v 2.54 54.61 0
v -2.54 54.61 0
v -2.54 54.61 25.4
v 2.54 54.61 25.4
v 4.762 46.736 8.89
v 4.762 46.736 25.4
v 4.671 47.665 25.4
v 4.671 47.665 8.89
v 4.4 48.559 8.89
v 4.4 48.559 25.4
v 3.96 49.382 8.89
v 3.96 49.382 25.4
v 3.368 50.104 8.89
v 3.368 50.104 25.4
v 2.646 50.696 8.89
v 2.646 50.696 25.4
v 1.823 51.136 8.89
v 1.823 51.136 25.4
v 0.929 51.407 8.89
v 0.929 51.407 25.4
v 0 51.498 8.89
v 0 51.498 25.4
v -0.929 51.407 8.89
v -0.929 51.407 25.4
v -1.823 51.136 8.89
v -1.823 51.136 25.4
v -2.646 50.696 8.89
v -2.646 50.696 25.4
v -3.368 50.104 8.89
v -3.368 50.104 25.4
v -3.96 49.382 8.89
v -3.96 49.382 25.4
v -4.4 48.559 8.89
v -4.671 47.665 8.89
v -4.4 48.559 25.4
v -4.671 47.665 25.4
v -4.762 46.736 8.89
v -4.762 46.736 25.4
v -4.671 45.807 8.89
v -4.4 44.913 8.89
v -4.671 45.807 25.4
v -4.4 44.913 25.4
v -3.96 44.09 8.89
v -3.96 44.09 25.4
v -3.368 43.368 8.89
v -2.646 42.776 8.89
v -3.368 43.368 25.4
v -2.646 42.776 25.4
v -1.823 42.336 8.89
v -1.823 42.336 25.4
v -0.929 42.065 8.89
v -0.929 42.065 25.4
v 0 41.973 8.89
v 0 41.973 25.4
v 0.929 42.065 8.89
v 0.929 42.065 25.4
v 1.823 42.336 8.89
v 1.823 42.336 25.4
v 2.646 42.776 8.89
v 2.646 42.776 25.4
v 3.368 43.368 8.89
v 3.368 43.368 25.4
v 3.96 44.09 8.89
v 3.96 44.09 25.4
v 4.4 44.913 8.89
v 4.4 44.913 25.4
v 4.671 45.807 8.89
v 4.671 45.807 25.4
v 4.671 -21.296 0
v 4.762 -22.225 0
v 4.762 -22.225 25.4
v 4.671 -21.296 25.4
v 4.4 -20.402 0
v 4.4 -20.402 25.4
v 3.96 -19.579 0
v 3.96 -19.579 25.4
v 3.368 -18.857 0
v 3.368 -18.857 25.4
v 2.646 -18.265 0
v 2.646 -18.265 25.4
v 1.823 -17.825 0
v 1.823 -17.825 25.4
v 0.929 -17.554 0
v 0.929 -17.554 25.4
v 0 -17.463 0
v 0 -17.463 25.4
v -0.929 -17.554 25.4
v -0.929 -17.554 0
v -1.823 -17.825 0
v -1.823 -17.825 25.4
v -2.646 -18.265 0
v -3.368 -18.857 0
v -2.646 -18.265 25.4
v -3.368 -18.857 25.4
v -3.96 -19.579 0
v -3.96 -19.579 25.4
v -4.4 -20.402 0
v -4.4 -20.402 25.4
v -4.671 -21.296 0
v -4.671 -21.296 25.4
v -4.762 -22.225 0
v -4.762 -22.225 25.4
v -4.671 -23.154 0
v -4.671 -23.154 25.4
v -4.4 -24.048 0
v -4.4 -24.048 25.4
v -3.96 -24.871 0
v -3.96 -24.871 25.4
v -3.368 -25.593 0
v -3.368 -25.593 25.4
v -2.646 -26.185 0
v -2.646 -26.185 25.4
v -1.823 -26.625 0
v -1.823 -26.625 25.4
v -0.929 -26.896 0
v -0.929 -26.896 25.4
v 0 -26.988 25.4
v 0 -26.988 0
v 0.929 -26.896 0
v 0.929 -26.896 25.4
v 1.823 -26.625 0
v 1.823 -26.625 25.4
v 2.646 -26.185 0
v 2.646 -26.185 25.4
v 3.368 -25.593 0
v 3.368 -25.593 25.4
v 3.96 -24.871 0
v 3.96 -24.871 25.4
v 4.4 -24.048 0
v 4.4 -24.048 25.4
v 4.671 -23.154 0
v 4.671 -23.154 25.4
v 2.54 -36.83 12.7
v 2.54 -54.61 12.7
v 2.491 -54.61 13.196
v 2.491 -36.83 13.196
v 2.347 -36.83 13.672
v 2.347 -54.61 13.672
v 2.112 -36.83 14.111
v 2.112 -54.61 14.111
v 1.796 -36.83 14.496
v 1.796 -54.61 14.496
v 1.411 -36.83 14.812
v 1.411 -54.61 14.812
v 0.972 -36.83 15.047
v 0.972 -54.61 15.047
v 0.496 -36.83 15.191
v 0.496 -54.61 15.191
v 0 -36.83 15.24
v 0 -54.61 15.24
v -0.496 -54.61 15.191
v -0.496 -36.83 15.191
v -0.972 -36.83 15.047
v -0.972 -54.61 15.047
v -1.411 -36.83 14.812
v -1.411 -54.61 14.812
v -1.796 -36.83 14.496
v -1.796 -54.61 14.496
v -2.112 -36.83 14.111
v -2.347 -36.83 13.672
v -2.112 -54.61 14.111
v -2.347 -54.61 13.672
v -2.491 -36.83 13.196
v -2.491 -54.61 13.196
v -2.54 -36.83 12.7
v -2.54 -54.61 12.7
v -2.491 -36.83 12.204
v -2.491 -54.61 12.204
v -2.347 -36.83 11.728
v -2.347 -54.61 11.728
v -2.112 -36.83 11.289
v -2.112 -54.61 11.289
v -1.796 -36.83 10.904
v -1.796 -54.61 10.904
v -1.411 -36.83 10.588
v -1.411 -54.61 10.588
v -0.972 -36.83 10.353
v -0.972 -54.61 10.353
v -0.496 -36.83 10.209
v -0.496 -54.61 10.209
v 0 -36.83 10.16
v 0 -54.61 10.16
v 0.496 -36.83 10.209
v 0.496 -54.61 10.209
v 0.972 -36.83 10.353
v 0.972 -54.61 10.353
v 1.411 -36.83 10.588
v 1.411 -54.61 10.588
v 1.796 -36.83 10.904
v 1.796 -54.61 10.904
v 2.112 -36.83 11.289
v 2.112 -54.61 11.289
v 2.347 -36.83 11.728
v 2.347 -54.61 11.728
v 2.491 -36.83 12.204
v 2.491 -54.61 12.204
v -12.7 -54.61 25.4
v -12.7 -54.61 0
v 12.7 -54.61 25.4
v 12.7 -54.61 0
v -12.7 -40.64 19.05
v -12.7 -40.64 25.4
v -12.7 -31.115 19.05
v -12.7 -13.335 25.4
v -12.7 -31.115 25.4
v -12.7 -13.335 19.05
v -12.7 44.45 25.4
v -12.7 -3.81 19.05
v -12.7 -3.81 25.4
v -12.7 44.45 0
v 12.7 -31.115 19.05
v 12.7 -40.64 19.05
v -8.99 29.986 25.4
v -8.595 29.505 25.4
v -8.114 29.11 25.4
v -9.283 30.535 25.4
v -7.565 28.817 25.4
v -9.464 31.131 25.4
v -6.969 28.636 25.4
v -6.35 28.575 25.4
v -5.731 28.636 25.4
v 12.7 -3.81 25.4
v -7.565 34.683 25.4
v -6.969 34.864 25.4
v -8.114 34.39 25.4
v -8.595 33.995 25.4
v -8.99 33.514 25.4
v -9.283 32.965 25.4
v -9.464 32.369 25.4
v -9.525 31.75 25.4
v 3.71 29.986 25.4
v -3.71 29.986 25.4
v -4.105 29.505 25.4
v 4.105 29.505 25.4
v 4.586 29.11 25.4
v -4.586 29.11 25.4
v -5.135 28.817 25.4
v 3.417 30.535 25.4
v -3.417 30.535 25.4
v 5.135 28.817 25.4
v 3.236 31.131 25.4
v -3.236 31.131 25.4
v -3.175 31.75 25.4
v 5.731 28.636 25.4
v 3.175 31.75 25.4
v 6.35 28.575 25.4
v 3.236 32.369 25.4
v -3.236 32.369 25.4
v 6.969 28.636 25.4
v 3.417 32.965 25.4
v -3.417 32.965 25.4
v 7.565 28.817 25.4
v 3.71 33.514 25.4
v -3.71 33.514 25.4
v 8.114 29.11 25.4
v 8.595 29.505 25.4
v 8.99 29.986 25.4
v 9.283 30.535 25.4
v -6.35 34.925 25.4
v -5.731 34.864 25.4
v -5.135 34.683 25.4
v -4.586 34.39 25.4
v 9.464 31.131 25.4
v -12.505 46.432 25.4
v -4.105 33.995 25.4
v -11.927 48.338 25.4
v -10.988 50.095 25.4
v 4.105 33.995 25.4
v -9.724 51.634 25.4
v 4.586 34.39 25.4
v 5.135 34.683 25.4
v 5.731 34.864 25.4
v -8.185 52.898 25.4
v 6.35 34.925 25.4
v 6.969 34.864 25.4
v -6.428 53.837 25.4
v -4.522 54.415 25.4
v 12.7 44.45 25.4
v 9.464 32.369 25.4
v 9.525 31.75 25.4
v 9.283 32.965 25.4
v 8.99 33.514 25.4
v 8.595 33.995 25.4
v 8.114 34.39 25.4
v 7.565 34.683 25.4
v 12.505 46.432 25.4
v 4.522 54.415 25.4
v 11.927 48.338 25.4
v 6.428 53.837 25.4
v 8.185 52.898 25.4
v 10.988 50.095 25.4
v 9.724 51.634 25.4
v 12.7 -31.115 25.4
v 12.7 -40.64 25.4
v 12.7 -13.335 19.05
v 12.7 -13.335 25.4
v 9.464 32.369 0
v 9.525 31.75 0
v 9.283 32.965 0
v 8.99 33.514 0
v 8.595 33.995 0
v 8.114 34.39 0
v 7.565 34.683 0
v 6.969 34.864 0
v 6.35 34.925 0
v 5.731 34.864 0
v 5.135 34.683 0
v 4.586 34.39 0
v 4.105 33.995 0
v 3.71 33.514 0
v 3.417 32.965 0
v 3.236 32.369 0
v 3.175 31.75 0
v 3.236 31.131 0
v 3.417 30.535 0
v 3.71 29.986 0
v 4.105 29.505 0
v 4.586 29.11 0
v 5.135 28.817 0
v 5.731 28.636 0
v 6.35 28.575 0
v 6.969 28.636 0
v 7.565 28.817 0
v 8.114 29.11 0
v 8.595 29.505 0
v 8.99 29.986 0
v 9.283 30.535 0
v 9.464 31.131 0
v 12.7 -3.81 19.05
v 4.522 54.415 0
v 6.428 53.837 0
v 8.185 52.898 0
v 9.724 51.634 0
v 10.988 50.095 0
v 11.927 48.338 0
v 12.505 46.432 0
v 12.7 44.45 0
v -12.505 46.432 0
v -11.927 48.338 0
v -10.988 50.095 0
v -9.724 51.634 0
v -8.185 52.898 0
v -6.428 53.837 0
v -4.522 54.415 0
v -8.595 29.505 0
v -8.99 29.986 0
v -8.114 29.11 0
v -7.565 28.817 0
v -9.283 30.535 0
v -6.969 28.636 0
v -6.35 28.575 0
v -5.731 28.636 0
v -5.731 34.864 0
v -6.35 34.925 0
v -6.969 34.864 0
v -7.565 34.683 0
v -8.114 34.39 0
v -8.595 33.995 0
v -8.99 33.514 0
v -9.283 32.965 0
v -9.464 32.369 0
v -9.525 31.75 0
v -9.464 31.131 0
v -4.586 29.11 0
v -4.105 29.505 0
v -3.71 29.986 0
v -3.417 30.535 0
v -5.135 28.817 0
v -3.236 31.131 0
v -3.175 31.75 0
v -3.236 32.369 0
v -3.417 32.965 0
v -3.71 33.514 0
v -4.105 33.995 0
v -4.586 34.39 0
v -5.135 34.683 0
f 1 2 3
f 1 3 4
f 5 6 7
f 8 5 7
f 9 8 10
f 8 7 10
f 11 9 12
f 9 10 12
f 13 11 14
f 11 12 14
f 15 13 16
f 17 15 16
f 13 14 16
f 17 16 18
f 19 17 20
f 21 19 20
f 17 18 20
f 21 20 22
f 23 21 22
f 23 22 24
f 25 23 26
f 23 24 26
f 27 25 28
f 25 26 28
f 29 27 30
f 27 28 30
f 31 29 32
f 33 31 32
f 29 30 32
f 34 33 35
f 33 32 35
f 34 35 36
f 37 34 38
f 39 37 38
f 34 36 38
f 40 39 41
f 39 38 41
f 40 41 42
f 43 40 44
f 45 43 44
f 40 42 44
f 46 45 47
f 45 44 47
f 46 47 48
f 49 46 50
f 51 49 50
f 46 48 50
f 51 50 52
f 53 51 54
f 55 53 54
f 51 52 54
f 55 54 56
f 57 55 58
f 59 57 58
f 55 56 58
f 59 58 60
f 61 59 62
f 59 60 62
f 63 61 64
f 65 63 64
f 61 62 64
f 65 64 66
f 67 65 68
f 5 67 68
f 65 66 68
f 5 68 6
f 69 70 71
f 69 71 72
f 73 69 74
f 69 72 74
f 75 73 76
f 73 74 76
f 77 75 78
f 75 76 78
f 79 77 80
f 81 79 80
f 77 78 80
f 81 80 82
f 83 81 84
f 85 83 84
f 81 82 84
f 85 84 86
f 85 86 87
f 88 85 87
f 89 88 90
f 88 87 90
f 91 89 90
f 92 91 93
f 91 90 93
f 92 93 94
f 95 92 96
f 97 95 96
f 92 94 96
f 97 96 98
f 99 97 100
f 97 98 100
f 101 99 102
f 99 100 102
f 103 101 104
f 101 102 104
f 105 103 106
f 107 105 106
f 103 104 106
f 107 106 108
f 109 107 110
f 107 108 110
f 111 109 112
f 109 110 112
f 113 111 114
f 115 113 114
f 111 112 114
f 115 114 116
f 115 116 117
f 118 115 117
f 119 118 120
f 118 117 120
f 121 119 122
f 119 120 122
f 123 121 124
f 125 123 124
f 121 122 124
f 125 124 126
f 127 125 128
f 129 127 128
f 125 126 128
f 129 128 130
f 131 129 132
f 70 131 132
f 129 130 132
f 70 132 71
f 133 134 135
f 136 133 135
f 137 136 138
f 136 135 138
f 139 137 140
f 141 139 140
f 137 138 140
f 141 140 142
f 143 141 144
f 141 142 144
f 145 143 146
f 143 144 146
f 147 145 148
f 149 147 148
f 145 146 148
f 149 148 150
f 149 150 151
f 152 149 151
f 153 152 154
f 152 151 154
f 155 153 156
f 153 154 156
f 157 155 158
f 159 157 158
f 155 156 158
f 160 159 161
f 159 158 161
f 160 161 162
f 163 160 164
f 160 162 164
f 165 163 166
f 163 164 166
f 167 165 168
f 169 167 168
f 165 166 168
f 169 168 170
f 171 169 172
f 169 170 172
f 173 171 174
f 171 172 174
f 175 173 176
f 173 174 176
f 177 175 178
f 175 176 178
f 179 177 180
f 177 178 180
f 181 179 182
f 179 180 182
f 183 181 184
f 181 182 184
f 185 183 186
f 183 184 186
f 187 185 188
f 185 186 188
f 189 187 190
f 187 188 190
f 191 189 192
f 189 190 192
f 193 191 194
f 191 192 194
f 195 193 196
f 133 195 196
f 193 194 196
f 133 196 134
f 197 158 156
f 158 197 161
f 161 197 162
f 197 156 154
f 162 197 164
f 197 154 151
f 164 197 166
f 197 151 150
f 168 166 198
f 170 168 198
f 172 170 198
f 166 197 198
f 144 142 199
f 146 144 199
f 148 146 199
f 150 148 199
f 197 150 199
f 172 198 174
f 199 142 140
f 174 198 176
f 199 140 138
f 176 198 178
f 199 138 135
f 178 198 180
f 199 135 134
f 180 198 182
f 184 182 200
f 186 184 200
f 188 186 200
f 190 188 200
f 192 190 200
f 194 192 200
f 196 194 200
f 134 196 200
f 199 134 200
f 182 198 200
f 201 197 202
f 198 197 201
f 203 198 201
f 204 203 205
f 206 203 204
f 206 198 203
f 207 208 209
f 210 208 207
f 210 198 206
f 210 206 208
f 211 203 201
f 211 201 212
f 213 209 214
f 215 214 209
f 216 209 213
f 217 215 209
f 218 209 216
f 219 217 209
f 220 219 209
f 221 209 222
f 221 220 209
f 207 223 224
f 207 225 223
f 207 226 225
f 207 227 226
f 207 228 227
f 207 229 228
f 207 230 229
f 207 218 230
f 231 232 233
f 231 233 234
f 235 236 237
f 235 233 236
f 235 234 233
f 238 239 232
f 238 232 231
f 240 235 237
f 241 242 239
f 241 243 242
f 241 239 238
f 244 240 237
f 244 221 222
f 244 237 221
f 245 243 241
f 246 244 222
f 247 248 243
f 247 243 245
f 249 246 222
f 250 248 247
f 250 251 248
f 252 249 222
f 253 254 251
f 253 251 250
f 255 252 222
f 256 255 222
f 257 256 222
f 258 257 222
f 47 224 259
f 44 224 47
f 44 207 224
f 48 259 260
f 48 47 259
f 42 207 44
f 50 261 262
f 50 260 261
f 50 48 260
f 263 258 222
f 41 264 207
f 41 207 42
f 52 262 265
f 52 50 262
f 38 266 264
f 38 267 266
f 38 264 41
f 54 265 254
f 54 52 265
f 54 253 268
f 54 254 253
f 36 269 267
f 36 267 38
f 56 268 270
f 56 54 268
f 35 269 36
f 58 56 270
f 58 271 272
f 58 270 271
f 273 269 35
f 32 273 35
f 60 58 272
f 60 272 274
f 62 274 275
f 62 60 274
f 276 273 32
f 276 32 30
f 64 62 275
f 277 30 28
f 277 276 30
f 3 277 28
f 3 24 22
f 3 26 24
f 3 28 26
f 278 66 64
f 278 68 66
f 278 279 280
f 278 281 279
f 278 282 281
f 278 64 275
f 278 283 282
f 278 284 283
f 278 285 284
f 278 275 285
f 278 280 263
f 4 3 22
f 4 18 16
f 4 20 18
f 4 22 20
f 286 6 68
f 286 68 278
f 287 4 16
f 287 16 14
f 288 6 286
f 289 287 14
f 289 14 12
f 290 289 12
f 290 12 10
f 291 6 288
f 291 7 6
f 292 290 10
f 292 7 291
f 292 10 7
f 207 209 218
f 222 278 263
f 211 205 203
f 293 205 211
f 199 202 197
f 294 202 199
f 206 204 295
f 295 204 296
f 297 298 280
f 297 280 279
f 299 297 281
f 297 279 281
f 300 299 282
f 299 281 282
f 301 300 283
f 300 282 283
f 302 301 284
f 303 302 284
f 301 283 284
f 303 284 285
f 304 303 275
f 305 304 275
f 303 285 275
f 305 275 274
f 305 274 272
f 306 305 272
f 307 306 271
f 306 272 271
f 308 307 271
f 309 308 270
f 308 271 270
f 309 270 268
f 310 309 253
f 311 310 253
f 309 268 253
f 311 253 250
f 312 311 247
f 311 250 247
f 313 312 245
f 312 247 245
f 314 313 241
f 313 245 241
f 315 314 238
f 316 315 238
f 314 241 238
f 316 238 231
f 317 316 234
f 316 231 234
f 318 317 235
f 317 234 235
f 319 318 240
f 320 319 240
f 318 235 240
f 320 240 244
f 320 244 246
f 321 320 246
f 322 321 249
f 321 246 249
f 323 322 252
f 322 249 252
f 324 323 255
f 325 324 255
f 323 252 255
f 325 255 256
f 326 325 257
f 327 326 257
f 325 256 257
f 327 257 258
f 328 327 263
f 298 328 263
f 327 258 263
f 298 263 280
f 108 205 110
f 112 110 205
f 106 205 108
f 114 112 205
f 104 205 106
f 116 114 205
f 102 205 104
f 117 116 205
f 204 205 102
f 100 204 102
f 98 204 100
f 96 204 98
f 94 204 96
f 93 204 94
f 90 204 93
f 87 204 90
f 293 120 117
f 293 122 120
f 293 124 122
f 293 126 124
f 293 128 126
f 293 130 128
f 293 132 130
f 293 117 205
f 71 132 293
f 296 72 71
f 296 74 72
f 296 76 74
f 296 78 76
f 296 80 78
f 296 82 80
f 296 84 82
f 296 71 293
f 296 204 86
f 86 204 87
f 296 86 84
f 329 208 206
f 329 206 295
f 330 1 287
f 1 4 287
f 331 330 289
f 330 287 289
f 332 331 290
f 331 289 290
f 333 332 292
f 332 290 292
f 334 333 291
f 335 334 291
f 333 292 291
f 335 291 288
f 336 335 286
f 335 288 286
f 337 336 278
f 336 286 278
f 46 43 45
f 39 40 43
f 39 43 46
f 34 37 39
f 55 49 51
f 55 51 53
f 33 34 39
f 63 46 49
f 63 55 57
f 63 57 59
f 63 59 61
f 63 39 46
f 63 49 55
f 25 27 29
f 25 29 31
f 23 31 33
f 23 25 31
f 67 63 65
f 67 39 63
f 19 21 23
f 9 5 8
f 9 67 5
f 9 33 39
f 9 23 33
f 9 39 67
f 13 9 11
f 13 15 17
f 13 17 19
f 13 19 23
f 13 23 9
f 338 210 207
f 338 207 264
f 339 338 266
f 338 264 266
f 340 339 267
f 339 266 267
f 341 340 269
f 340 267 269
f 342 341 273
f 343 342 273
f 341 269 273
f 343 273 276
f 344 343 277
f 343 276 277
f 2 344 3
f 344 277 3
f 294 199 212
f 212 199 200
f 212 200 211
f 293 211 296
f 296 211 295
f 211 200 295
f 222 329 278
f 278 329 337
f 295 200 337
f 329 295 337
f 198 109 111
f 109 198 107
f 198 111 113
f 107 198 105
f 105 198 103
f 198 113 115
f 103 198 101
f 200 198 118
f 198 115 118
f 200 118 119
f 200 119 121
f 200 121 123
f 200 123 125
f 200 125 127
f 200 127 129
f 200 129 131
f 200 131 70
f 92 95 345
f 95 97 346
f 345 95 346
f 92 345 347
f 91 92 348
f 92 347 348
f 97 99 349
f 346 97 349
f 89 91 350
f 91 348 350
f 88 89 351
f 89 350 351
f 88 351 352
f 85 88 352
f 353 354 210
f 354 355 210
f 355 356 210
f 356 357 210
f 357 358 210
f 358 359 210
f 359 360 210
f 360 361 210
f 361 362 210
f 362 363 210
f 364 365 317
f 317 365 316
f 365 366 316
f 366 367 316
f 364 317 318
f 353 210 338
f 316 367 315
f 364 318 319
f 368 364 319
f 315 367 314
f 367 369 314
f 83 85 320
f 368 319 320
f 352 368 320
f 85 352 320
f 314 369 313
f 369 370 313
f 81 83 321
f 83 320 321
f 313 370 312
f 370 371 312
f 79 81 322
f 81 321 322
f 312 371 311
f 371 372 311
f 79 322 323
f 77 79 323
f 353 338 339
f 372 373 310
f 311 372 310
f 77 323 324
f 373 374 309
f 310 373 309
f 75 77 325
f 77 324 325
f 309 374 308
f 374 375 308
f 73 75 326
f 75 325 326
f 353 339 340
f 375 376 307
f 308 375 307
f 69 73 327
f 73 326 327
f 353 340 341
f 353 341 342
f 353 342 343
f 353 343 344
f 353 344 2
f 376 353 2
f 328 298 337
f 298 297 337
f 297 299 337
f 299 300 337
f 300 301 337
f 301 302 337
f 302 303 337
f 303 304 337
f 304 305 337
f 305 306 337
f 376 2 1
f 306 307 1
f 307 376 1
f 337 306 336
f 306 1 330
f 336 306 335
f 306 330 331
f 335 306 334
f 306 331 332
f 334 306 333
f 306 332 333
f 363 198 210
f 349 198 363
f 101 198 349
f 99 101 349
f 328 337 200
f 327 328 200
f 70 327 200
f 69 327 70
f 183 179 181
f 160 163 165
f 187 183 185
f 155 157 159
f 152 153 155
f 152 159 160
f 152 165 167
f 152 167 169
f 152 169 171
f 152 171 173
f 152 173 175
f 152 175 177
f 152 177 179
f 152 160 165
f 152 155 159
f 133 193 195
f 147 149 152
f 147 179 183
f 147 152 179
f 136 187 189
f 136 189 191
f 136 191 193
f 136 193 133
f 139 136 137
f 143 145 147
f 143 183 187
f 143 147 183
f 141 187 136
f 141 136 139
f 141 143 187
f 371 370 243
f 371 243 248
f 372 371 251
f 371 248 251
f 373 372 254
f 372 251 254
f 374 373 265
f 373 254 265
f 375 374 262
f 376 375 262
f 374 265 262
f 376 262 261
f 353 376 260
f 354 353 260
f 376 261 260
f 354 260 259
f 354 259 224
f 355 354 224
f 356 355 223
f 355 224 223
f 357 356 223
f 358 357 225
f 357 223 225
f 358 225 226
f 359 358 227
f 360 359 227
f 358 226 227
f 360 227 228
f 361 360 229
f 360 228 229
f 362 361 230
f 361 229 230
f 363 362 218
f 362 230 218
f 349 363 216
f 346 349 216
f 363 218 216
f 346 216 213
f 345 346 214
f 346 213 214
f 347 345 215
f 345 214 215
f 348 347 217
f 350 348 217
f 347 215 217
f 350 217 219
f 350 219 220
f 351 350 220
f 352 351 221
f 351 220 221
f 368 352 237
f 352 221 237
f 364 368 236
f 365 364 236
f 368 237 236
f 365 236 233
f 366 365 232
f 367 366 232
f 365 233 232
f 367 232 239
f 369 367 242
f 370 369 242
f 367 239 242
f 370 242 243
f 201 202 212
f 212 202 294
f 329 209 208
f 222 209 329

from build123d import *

# Parameters (mm, degrees)
SKETCH2_W           = 25.4
SKETCH2_H           = 109.22
BOSS_EXTRUDE1_DEPTH = 25.4
SKETCH3_R           = 4.7625
SKETCH3_R_2         = 3.175
CUT_EXTRUDE1_DEPTH  = 25.4
SKETCH4_W           = 25.4
SKETCH4_H           = 9.525
CUT_EXTRUDE2_DEPTH  = 6.35
SKETCH5_R           = 4.7625
CUT_EXTRUDE3_DEPTH  = 16.51
SKETCH6_R           = 2.54
CUT_EXTRUDE4_DEPTH  = 17.78
FILLET1_R           = 10.16


with BuildPart() as part:
    # Sketch2 → Boss-Extrude1 (new body)
    with BuildSketch(Plane.XY):
        Rectangle(SKETCH2_W, SKETCH2_H)
    extrude(amount=BOSS_EXTRUDE1_DEPTH)

    # Sketch3 → Cut-Extrude1 (cut)
    with BuildSketch(Plane.XY.offset(25.4)):
        with Locations((0, -22.225)):
            Circle(SKETCH3_R)
        with Locations((6.35, 31.75)):
            Circle(SKETCH3_R_2)
        with Locations((-6.35, 31.75)):
            Circle(SKETCH3_R_2)
    extrude(amount=-CUT_EXTRUDE1_DEPTH, mode=Mode.SUBTRACT)

    # Sketch4 → Cut-Extrude2 (cut)
    with BuildSketch(Plane.XY.offset(25.4)):
        with Locations((0, -8.5725)):
            Rectangle(SKETCH4_W, SKETCH4_H)
        with Locations((0, -35.8775)):
            Rectangle(SKETCH4_W, SKETCH4_H)
    extrude(amount=-CUT_EXTRUDE2_DEPTH, mode=Mode.SUBTRACT)

    # Sketch5 → Cut-Extrude3 (cut)
    with BuildSketch(Plane.XY.offset(25.4)):
        with Locations((0, 46.736)):
            Circle(SKETCH5_R)
    extrude(amount=-CUT_EXTRUDE3_DEPTH, mode=Mode.SUBTRACT)

    # Sketch6 → Cut-Extrude4 (cut)
    with BuildSketch(Plane.XZ.offset(54.61)):
        with Locations((0, 12.7)):
            Circle(SKETCH6_R)
    extrude(amount=-CUT_EXTRUDE4_DEPTH, mode=Mode.SUBTRACT)

    # Fillet1
    fillet1_edges = [part.edges().sort_by_distance(p)[0] for p in [
        (-12.7, 54.61, 12.7),
        (12.7, 54.61, 12.7),
    ]]
    fillet(fillet1_edges, radius=FILLET1_R)


solid = part.part
